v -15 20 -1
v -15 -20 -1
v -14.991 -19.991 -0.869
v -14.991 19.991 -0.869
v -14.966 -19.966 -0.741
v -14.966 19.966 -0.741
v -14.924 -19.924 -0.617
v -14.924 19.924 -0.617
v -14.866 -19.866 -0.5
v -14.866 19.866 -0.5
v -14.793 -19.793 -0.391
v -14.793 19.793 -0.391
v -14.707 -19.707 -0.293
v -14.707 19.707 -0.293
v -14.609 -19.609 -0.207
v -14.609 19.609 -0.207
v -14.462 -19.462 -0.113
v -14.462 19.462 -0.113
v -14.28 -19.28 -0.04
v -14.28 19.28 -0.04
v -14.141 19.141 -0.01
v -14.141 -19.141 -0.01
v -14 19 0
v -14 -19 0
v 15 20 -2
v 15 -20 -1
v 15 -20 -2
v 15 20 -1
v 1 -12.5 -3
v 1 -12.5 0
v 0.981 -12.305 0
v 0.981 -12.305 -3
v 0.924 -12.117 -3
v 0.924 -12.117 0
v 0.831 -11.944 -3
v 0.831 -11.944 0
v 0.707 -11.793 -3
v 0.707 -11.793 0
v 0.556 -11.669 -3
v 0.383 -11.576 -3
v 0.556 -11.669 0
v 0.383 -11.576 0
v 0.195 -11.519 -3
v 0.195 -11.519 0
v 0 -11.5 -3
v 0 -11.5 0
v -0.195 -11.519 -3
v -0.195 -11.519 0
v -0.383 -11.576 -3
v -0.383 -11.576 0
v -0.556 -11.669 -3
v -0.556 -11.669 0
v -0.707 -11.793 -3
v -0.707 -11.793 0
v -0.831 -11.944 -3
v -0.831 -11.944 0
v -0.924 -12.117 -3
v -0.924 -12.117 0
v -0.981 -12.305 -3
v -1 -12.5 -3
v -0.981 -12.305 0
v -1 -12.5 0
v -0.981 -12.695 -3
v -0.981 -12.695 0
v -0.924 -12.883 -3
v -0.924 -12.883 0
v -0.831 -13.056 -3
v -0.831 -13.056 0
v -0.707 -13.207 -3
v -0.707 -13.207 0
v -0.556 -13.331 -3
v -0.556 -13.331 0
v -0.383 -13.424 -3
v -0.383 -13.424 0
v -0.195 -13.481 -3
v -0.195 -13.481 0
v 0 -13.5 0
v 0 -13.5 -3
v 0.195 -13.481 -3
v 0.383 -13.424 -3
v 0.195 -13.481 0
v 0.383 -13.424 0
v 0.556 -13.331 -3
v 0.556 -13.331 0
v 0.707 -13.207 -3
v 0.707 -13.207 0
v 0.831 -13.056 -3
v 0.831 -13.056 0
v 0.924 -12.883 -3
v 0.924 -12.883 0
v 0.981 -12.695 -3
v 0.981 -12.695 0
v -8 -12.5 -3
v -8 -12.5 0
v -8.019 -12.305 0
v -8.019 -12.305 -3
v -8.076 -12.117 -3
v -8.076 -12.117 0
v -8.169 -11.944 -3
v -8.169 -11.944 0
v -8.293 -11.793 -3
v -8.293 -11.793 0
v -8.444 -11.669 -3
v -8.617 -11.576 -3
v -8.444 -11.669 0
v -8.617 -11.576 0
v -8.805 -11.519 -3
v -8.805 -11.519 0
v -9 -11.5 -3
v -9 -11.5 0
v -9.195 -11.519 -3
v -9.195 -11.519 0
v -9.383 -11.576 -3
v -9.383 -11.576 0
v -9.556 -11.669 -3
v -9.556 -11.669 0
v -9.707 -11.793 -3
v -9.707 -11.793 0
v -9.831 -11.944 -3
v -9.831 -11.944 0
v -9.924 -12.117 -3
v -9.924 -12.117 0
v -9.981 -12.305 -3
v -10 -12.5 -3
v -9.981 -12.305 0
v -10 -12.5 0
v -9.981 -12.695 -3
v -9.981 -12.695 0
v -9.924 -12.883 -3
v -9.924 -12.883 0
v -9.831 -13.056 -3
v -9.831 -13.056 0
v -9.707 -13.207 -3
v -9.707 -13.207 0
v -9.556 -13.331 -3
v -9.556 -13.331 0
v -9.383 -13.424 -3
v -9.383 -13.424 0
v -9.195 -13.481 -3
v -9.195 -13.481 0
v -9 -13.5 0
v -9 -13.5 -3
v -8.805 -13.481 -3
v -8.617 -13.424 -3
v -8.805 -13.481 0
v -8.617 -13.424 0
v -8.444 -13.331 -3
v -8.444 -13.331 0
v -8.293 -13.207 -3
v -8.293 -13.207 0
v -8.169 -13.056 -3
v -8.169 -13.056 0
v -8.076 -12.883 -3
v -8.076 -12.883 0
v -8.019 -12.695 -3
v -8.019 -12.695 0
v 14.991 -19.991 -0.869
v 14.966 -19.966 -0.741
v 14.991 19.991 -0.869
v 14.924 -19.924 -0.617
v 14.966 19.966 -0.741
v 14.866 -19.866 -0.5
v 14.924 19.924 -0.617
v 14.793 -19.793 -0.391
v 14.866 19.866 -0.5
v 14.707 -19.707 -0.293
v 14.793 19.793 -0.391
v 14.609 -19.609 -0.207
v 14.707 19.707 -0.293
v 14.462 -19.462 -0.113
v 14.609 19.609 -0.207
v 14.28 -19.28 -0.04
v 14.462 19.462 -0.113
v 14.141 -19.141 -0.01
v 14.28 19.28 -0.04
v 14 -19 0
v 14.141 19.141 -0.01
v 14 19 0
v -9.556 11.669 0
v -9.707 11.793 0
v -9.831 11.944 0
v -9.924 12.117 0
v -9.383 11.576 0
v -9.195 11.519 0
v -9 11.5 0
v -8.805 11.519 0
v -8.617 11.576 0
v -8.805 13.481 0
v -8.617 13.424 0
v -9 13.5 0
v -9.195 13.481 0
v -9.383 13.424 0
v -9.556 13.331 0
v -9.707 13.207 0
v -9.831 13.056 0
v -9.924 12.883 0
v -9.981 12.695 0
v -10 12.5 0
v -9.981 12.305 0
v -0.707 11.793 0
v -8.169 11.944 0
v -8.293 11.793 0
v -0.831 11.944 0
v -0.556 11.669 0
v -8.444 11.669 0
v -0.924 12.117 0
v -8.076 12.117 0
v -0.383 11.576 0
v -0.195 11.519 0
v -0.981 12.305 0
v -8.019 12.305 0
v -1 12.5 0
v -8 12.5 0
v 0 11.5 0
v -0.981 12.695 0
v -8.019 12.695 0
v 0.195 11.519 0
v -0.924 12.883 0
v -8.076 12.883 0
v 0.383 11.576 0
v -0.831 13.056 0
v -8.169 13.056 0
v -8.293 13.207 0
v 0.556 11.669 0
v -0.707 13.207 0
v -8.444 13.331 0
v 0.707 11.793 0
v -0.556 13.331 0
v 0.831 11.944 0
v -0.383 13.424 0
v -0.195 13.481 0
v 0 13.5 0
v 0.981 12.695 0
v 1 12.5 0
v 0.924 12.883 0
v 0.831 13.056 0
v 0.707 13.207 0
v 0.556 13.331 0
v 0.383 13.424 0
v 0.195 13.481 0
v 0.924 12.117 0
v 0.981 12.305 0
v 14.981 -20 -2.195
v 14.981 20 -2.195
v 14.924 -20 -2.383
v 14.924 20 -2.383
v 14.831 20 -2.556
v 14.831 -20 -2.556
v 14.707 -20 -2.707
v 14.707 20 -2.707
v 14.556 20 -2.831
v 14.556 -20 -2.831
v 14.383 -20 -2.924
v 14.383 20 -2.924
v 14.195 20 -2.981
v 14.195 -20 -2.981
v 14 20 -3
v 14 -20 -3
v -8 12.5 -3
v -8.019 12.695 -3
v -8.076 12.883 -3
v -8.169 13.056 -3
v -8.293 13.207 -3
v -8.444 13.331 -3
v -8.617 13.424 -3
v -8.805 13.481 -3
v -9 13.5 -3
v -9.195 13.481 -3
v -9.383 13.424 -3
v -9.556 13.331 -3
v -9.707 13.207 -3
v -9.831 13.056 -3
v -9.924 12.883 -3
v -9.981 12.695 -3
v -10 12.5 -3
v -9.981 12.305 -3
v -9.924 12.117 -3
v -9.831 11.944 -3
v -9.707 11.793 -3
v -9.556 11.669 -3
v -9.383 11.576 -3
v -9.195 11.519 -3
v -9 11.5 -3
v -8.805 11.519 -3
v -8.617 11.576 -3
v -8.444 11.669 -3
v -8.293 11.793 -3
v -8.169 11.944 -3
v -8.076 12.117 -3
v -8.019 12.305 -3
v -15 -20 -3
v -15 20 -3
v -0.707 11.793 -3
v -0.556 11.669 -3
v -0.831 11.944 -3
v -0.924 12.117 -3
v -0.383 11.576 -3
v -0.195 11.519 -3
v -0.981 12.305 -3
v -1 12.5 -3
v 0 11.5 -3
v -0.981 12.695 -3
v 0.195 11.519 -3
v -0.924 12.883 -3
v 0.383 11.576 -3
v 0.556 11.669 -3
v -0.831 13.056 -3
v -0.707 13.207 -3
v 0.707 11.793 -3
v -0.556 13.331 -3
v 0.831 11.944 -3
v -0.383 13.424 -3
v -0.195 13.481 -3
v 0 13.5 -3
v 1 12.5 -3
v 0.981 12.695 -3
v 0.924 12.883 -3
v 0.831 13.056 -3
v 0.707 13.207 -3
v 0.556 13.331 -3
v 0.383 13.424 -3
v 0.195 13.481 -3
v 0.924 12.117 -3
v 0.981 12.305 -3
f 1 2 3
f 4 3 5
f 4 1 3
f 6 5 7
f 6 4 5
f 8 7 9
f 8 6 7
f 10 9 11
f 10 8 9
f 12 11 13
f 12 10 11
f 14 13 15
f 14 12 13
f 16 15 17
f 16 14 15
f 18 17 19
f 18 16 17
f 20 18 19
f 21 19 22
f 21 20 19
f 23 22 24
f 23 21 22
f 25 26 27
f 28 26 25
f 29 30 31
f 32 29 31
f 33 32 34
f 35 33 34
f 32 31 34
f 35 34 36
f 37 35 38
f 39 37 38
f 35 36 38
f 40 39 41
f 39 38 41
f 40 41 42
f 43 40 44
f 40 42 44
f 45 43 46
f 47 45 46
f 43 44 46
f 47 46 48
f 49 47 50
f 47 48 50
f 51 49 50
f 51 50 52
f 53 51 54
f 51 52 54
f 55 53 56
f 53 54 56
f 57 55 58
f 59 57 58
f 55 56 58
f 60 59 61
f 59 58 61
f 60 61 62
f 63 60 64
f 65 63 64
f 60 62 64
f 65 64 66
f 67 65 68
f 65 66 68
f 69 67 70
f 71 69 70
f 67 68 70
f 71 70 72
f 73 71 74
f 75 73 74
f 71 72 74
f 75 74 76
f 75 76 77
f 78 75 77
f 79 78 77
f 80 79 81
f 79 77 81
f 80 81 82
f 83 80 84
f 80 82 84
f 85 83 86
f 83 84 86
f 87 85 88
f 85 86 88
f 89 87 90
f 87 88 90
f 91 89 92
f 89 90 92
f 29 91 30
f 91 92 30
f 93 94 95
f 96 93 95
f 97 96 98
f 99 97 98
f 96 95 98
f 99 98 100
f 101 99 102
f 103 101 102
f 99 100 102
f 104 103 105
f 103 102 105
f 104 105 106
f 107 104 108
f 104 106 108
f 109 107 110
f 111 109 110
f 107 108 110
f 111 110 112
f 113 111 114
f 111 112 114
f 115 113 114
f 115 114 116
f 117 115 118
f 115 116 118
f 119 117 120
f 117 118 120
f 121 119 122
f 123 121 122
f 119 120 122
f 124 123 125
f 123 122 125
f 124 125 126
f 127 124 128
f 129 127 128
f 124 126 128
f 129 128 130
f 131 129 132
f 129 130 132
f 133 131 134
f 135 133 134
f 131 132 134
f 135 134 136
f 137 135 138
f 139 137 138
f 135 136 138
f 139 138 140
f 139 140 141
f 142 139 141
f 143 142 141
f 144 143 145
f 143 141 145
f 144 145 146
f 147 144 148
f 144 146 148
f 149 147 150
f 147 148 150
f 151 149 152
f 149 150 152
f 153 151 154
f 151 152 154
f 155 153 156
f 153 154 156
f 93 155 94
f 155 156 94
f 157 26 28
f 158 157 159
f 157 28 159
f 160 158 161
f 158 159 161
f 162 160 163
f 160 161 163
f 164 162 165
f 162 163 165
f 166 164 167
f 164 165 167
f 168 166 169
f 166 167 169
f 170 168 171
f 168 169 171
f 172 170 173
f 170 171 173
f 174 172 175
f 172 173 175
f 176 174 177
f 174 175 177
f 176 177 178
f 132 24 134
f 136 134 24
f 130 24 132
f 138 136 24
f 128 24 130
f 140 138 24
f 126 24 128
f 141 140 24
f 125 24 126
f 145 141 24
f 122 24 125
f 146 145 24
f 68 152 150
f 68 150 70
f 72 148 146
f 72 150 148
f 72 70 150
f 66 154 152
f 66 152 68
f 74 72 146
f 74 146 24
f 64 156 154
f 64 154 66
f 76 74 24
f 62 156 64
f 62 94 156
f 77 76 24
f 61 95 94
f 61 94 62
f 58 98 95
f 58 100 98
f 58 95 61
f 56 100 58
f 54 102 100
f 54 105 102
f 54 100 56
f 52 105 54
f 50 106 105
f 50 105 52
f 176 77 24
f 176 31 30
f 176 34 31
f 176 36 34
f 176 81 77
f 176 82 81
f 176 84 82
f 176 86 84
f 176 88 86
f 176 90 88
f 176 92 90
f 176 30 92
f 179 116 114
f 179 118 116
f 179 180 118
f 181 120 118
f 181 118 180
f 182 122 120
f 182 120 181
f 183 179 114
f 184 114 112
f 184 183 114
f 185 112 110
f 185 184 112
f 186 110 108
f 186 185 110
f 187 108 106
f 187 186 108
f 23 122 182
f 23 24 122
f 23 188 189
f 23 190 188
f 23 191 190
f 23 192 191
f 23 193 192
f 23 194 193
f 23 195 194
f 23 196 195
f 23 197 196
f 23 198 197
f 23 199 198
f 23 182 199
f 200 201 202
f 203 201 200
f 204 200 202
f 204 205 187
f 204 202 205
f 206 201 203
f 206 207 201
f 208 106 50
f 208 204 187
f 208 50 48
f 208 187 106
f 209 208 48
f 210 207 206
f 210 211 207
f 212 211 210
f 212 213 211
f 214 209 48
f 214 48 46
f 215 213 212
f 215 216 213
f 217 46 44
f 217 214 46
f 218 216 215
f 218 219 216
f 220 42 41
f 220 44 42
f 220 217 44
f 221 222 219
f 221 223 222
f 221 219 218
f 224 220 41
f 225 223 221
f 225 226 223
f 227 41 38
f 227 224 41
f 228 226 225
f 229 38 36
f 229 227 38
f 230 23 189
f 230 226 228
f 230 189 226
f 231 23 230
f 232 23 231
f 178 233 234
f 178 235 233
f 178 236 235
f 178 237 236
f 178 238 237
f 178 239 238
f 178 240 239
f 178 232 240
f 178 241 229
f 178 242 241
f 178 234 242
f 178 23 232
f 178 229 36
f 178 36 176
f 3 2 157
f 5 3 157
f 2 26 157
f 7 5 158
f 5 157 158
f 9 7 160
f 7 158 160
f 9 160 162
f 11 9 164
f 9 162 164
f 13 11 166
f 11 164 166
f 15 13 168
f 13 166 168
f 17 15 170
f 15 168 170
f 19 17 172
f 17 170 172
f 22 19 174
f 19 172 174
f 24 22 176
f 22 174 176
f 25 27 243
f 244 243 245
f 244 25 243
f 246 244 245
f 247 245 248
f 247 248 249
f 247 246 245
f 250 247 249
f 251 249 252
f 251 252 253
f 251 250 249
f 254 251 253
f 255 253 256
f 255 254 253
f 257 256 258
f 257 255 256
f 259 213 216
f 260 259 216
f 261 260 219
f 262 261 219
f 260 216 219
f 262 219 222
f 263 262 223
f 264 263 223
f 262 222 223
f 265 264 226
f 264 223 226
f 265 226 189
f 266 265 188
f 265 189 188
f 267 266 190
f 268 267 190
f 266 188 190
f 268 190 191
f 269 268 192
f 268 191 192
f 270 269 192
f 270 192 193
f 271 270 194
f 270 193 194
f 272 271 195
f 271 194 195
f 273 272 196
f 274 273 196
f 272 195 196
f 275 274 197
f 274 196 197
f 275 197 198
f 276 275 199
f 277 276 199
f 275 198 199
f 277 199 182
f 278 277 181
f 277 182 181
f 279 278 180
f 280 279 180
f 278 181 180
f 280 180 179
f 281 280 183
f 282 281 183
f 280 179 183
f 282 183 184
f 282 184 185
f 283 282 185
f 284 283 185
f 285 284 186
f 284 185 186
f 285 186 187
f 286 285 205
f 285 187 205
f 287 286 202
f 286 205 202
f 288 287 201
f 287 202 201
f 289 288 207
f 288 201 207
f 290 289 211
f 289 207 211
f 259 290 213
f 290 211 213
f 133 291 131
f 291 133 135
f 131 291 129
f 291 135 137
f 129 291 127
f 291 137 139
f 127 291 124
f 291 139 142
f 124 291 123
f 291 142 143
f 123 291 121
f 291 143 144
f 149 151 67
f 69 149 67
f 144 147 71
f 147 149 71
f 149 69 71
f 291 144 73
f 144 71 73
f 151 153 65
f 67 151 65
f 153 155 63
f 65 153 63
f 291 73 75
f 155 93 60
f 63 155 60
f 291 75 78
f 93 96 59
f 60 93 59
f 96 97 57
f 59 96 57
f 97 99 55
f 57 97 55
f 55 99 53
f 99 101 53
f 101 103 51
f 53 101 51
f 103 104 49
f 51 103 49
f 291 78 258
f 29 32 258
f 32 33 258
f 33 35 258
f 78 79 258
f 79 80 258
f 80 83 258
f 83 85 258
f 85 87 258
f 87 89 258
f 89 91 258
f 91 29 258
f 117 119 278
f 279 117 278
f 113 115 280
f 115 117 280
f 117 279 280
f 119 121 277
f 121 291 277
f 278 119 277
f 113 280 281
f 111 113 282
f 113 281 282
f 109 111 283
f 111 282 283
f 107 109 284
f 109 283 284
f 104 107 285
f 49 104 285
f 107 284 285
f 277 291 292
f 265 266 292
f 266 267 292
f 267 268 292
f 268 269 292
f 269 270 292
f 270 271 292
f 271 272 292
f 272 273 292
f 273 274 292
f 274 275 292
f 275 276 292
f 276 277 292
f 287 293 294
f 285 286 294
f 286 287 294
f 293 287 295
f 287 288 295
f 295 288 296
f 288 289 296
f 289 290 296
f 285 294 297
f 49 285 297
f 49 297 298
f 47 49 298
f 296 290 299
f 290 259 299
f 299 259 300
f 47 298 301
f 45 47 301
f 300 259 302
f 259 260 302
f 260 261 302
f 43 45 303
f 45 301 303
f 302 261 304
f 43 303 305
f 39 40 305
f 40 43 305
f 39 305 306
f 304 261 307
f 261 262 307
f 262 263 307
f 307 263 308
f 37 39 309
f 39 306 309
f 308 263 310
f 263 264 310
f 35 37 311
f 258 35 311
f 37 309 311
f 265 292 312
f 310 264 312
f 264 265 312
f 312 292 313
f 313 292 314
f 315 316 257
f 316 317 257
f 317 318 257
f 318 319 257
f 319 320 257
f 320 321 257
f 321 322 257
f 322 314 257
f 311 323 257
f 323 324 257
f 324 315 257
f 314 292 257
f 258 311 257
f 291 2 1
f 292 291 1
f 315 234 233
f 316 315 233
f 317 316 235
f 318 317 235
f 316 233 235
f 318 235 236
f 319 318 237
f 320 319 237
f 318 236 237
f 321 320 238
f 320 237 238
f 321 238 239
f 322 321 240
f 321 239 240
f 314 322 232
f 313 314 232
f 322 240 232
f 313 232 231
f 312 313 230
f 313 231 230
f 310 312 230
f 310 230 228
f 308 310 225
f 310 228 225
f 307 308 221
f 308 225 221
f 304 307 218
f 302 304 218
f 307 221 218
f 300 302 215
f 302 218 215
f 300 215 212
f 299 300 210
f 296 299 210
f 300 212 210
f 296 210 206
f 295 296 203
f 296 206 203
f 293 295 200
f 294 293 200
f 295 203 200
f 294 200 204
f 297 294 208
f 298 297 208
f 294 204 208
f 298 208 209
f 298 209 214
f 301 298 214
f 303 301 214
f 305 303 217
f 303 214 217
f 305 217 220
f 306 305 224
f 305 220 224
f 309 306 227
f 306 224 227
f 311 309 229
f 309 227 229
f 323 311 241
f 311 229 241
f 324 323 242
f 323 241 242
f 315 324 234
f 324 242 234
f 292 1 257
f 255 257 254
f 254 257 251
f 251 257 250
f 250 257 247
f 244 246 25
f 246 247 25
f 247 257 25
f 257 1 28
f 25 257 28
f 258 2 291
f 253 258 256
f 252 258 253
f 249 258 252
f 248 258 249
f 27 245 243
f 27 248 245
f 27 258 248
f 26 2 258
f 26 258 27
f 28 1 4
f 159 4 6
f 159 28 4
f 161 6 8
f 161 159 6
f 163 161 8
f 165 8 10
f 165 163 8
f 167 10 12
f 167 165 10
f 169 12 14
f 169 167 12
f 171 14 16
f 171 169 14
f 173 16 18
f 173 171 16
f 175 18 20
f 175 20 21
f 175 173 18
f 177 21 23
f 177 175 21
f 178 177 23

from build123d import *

# Parameters (mm, degrees)
F0_W     = 30
F0_H     = 40
F0_R     = 1
F1_DEPTH = 3
F2_R     = 1


# Not quite as in the source:
# - a feature names something its author has since deleted; it is built from what else it names


with BuildPart() as f1:
    # F0 (on Top) → F1 (new body)
    with BuildSketch(Plane.XY):
        Rectangle(F0_W, F0_H)
        with Locations((-9, -12.5)):
            Circle(F0_R, mode=Mode.SUBTRACT)
        with Locations((0, -12.5)):
            Circle(F0_R, mode=Mode.SUBTRACT)
        with Locations((-9, 12.5)):
            Circle(F0_R, mode=Mode.SUBTRACT)
        with Locations((0, 12.5)):
            Circle(F0_R, mode=Mode.SUBTRACT)
    extrude(amount=-F1_DEPTH)

    # F2
    f2_edges = [f1.edges().sort_by_distance(p)[0] for p in [
        (-15, 0, 0),
        (0, 20, 0),
        (15, 0, 0),
        (0, -20, 0),
        (15, 0, -3),
    ]]
    fillet(f2_edges, radius=F2_R)


solid = f1.part
